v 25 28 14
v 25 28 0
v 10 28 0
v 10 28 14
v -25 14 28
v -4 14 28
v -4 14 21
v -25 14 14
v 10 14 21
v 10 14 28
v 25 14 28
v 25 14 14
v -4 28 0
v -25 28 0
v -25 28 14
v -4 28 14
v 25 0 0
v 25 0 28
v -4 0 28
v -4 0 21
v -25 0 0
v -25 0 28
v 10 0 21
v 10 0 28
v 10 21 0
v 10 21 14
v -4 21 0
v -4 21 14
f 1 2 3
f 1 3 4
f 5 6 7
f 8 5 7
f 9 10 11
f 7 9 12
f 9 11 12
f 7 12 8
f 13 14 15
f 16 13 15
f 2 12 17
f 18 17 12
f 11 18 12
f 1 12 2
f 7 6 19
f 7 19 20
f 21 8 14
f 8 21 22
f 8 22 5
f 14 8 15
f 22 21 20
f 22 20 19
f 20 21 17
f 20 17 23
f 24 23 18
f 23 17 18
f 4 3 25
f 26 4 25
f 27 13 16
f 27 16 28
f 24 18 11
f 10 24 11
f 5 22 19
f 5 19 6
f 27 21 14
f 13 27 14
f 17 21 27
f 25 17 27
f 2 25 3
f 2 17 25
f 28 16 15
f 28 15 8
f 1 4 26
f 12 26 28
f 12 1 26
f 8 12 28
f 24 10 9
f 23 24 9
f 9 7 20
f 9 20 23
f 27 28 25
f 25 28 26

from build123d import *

# Parameters (mm, degrees)
BOSS_EXTRUDE1_DEPTH = 25
CUT_EXTRUDE1_REACH  = 16
SKETCH3_W           = 14
SKETCH3_H           = 7


with BuildPart() as part:
    # Sketch2 → Boss-Extrude1 (new body, symmetric)
    with BuildSketch(Plane(origin=(0, 0, 0), x_dir=(0, 0, -1), z_dir=(1, 0, 0))):
        Polygon((0, 0), (-28, 0), (-28, 14), (-14, 14), align=None)
    extrude(amount=BOSS_EXTRUDE1_DEPTH, both=True)

    # Sketch3 → Cut-Extrude1 (cut, up to next)
    with BuildSketch(Plane(origin=(0, 14, 0), x_dir=(1, 0, 0), z_dir=(0, 1, 0)), mode=Mode.PRIVATE) as cut_extrude1_sk1:
        with Locations((3, -24.5)):
            Rectangle(SKETCH3_W, SKETCH3_H)
    cut_extrude1_tool1 = extrude(cut_extrude1_sk1.sketch, amount=-CUT_EXTRUDE1_REACH, mode=Mode.PRIVATE) & part.part
    add(cut_extrude1_tool1.solids().sort_by_distance((3, 14, 24.5))[0], mode=Mode.SUBTRACT)

    # Mirror1: part across plane


with BuildPart() as part_1:
    add(part.part)
    add(part.part.mirror(Plane(origin=(25, 14, 14), x_dir=(0, 0.707106781, 0.707106781), z_dir=(0, -0.707106781, 0.707106781))))


solid = part_1.part
